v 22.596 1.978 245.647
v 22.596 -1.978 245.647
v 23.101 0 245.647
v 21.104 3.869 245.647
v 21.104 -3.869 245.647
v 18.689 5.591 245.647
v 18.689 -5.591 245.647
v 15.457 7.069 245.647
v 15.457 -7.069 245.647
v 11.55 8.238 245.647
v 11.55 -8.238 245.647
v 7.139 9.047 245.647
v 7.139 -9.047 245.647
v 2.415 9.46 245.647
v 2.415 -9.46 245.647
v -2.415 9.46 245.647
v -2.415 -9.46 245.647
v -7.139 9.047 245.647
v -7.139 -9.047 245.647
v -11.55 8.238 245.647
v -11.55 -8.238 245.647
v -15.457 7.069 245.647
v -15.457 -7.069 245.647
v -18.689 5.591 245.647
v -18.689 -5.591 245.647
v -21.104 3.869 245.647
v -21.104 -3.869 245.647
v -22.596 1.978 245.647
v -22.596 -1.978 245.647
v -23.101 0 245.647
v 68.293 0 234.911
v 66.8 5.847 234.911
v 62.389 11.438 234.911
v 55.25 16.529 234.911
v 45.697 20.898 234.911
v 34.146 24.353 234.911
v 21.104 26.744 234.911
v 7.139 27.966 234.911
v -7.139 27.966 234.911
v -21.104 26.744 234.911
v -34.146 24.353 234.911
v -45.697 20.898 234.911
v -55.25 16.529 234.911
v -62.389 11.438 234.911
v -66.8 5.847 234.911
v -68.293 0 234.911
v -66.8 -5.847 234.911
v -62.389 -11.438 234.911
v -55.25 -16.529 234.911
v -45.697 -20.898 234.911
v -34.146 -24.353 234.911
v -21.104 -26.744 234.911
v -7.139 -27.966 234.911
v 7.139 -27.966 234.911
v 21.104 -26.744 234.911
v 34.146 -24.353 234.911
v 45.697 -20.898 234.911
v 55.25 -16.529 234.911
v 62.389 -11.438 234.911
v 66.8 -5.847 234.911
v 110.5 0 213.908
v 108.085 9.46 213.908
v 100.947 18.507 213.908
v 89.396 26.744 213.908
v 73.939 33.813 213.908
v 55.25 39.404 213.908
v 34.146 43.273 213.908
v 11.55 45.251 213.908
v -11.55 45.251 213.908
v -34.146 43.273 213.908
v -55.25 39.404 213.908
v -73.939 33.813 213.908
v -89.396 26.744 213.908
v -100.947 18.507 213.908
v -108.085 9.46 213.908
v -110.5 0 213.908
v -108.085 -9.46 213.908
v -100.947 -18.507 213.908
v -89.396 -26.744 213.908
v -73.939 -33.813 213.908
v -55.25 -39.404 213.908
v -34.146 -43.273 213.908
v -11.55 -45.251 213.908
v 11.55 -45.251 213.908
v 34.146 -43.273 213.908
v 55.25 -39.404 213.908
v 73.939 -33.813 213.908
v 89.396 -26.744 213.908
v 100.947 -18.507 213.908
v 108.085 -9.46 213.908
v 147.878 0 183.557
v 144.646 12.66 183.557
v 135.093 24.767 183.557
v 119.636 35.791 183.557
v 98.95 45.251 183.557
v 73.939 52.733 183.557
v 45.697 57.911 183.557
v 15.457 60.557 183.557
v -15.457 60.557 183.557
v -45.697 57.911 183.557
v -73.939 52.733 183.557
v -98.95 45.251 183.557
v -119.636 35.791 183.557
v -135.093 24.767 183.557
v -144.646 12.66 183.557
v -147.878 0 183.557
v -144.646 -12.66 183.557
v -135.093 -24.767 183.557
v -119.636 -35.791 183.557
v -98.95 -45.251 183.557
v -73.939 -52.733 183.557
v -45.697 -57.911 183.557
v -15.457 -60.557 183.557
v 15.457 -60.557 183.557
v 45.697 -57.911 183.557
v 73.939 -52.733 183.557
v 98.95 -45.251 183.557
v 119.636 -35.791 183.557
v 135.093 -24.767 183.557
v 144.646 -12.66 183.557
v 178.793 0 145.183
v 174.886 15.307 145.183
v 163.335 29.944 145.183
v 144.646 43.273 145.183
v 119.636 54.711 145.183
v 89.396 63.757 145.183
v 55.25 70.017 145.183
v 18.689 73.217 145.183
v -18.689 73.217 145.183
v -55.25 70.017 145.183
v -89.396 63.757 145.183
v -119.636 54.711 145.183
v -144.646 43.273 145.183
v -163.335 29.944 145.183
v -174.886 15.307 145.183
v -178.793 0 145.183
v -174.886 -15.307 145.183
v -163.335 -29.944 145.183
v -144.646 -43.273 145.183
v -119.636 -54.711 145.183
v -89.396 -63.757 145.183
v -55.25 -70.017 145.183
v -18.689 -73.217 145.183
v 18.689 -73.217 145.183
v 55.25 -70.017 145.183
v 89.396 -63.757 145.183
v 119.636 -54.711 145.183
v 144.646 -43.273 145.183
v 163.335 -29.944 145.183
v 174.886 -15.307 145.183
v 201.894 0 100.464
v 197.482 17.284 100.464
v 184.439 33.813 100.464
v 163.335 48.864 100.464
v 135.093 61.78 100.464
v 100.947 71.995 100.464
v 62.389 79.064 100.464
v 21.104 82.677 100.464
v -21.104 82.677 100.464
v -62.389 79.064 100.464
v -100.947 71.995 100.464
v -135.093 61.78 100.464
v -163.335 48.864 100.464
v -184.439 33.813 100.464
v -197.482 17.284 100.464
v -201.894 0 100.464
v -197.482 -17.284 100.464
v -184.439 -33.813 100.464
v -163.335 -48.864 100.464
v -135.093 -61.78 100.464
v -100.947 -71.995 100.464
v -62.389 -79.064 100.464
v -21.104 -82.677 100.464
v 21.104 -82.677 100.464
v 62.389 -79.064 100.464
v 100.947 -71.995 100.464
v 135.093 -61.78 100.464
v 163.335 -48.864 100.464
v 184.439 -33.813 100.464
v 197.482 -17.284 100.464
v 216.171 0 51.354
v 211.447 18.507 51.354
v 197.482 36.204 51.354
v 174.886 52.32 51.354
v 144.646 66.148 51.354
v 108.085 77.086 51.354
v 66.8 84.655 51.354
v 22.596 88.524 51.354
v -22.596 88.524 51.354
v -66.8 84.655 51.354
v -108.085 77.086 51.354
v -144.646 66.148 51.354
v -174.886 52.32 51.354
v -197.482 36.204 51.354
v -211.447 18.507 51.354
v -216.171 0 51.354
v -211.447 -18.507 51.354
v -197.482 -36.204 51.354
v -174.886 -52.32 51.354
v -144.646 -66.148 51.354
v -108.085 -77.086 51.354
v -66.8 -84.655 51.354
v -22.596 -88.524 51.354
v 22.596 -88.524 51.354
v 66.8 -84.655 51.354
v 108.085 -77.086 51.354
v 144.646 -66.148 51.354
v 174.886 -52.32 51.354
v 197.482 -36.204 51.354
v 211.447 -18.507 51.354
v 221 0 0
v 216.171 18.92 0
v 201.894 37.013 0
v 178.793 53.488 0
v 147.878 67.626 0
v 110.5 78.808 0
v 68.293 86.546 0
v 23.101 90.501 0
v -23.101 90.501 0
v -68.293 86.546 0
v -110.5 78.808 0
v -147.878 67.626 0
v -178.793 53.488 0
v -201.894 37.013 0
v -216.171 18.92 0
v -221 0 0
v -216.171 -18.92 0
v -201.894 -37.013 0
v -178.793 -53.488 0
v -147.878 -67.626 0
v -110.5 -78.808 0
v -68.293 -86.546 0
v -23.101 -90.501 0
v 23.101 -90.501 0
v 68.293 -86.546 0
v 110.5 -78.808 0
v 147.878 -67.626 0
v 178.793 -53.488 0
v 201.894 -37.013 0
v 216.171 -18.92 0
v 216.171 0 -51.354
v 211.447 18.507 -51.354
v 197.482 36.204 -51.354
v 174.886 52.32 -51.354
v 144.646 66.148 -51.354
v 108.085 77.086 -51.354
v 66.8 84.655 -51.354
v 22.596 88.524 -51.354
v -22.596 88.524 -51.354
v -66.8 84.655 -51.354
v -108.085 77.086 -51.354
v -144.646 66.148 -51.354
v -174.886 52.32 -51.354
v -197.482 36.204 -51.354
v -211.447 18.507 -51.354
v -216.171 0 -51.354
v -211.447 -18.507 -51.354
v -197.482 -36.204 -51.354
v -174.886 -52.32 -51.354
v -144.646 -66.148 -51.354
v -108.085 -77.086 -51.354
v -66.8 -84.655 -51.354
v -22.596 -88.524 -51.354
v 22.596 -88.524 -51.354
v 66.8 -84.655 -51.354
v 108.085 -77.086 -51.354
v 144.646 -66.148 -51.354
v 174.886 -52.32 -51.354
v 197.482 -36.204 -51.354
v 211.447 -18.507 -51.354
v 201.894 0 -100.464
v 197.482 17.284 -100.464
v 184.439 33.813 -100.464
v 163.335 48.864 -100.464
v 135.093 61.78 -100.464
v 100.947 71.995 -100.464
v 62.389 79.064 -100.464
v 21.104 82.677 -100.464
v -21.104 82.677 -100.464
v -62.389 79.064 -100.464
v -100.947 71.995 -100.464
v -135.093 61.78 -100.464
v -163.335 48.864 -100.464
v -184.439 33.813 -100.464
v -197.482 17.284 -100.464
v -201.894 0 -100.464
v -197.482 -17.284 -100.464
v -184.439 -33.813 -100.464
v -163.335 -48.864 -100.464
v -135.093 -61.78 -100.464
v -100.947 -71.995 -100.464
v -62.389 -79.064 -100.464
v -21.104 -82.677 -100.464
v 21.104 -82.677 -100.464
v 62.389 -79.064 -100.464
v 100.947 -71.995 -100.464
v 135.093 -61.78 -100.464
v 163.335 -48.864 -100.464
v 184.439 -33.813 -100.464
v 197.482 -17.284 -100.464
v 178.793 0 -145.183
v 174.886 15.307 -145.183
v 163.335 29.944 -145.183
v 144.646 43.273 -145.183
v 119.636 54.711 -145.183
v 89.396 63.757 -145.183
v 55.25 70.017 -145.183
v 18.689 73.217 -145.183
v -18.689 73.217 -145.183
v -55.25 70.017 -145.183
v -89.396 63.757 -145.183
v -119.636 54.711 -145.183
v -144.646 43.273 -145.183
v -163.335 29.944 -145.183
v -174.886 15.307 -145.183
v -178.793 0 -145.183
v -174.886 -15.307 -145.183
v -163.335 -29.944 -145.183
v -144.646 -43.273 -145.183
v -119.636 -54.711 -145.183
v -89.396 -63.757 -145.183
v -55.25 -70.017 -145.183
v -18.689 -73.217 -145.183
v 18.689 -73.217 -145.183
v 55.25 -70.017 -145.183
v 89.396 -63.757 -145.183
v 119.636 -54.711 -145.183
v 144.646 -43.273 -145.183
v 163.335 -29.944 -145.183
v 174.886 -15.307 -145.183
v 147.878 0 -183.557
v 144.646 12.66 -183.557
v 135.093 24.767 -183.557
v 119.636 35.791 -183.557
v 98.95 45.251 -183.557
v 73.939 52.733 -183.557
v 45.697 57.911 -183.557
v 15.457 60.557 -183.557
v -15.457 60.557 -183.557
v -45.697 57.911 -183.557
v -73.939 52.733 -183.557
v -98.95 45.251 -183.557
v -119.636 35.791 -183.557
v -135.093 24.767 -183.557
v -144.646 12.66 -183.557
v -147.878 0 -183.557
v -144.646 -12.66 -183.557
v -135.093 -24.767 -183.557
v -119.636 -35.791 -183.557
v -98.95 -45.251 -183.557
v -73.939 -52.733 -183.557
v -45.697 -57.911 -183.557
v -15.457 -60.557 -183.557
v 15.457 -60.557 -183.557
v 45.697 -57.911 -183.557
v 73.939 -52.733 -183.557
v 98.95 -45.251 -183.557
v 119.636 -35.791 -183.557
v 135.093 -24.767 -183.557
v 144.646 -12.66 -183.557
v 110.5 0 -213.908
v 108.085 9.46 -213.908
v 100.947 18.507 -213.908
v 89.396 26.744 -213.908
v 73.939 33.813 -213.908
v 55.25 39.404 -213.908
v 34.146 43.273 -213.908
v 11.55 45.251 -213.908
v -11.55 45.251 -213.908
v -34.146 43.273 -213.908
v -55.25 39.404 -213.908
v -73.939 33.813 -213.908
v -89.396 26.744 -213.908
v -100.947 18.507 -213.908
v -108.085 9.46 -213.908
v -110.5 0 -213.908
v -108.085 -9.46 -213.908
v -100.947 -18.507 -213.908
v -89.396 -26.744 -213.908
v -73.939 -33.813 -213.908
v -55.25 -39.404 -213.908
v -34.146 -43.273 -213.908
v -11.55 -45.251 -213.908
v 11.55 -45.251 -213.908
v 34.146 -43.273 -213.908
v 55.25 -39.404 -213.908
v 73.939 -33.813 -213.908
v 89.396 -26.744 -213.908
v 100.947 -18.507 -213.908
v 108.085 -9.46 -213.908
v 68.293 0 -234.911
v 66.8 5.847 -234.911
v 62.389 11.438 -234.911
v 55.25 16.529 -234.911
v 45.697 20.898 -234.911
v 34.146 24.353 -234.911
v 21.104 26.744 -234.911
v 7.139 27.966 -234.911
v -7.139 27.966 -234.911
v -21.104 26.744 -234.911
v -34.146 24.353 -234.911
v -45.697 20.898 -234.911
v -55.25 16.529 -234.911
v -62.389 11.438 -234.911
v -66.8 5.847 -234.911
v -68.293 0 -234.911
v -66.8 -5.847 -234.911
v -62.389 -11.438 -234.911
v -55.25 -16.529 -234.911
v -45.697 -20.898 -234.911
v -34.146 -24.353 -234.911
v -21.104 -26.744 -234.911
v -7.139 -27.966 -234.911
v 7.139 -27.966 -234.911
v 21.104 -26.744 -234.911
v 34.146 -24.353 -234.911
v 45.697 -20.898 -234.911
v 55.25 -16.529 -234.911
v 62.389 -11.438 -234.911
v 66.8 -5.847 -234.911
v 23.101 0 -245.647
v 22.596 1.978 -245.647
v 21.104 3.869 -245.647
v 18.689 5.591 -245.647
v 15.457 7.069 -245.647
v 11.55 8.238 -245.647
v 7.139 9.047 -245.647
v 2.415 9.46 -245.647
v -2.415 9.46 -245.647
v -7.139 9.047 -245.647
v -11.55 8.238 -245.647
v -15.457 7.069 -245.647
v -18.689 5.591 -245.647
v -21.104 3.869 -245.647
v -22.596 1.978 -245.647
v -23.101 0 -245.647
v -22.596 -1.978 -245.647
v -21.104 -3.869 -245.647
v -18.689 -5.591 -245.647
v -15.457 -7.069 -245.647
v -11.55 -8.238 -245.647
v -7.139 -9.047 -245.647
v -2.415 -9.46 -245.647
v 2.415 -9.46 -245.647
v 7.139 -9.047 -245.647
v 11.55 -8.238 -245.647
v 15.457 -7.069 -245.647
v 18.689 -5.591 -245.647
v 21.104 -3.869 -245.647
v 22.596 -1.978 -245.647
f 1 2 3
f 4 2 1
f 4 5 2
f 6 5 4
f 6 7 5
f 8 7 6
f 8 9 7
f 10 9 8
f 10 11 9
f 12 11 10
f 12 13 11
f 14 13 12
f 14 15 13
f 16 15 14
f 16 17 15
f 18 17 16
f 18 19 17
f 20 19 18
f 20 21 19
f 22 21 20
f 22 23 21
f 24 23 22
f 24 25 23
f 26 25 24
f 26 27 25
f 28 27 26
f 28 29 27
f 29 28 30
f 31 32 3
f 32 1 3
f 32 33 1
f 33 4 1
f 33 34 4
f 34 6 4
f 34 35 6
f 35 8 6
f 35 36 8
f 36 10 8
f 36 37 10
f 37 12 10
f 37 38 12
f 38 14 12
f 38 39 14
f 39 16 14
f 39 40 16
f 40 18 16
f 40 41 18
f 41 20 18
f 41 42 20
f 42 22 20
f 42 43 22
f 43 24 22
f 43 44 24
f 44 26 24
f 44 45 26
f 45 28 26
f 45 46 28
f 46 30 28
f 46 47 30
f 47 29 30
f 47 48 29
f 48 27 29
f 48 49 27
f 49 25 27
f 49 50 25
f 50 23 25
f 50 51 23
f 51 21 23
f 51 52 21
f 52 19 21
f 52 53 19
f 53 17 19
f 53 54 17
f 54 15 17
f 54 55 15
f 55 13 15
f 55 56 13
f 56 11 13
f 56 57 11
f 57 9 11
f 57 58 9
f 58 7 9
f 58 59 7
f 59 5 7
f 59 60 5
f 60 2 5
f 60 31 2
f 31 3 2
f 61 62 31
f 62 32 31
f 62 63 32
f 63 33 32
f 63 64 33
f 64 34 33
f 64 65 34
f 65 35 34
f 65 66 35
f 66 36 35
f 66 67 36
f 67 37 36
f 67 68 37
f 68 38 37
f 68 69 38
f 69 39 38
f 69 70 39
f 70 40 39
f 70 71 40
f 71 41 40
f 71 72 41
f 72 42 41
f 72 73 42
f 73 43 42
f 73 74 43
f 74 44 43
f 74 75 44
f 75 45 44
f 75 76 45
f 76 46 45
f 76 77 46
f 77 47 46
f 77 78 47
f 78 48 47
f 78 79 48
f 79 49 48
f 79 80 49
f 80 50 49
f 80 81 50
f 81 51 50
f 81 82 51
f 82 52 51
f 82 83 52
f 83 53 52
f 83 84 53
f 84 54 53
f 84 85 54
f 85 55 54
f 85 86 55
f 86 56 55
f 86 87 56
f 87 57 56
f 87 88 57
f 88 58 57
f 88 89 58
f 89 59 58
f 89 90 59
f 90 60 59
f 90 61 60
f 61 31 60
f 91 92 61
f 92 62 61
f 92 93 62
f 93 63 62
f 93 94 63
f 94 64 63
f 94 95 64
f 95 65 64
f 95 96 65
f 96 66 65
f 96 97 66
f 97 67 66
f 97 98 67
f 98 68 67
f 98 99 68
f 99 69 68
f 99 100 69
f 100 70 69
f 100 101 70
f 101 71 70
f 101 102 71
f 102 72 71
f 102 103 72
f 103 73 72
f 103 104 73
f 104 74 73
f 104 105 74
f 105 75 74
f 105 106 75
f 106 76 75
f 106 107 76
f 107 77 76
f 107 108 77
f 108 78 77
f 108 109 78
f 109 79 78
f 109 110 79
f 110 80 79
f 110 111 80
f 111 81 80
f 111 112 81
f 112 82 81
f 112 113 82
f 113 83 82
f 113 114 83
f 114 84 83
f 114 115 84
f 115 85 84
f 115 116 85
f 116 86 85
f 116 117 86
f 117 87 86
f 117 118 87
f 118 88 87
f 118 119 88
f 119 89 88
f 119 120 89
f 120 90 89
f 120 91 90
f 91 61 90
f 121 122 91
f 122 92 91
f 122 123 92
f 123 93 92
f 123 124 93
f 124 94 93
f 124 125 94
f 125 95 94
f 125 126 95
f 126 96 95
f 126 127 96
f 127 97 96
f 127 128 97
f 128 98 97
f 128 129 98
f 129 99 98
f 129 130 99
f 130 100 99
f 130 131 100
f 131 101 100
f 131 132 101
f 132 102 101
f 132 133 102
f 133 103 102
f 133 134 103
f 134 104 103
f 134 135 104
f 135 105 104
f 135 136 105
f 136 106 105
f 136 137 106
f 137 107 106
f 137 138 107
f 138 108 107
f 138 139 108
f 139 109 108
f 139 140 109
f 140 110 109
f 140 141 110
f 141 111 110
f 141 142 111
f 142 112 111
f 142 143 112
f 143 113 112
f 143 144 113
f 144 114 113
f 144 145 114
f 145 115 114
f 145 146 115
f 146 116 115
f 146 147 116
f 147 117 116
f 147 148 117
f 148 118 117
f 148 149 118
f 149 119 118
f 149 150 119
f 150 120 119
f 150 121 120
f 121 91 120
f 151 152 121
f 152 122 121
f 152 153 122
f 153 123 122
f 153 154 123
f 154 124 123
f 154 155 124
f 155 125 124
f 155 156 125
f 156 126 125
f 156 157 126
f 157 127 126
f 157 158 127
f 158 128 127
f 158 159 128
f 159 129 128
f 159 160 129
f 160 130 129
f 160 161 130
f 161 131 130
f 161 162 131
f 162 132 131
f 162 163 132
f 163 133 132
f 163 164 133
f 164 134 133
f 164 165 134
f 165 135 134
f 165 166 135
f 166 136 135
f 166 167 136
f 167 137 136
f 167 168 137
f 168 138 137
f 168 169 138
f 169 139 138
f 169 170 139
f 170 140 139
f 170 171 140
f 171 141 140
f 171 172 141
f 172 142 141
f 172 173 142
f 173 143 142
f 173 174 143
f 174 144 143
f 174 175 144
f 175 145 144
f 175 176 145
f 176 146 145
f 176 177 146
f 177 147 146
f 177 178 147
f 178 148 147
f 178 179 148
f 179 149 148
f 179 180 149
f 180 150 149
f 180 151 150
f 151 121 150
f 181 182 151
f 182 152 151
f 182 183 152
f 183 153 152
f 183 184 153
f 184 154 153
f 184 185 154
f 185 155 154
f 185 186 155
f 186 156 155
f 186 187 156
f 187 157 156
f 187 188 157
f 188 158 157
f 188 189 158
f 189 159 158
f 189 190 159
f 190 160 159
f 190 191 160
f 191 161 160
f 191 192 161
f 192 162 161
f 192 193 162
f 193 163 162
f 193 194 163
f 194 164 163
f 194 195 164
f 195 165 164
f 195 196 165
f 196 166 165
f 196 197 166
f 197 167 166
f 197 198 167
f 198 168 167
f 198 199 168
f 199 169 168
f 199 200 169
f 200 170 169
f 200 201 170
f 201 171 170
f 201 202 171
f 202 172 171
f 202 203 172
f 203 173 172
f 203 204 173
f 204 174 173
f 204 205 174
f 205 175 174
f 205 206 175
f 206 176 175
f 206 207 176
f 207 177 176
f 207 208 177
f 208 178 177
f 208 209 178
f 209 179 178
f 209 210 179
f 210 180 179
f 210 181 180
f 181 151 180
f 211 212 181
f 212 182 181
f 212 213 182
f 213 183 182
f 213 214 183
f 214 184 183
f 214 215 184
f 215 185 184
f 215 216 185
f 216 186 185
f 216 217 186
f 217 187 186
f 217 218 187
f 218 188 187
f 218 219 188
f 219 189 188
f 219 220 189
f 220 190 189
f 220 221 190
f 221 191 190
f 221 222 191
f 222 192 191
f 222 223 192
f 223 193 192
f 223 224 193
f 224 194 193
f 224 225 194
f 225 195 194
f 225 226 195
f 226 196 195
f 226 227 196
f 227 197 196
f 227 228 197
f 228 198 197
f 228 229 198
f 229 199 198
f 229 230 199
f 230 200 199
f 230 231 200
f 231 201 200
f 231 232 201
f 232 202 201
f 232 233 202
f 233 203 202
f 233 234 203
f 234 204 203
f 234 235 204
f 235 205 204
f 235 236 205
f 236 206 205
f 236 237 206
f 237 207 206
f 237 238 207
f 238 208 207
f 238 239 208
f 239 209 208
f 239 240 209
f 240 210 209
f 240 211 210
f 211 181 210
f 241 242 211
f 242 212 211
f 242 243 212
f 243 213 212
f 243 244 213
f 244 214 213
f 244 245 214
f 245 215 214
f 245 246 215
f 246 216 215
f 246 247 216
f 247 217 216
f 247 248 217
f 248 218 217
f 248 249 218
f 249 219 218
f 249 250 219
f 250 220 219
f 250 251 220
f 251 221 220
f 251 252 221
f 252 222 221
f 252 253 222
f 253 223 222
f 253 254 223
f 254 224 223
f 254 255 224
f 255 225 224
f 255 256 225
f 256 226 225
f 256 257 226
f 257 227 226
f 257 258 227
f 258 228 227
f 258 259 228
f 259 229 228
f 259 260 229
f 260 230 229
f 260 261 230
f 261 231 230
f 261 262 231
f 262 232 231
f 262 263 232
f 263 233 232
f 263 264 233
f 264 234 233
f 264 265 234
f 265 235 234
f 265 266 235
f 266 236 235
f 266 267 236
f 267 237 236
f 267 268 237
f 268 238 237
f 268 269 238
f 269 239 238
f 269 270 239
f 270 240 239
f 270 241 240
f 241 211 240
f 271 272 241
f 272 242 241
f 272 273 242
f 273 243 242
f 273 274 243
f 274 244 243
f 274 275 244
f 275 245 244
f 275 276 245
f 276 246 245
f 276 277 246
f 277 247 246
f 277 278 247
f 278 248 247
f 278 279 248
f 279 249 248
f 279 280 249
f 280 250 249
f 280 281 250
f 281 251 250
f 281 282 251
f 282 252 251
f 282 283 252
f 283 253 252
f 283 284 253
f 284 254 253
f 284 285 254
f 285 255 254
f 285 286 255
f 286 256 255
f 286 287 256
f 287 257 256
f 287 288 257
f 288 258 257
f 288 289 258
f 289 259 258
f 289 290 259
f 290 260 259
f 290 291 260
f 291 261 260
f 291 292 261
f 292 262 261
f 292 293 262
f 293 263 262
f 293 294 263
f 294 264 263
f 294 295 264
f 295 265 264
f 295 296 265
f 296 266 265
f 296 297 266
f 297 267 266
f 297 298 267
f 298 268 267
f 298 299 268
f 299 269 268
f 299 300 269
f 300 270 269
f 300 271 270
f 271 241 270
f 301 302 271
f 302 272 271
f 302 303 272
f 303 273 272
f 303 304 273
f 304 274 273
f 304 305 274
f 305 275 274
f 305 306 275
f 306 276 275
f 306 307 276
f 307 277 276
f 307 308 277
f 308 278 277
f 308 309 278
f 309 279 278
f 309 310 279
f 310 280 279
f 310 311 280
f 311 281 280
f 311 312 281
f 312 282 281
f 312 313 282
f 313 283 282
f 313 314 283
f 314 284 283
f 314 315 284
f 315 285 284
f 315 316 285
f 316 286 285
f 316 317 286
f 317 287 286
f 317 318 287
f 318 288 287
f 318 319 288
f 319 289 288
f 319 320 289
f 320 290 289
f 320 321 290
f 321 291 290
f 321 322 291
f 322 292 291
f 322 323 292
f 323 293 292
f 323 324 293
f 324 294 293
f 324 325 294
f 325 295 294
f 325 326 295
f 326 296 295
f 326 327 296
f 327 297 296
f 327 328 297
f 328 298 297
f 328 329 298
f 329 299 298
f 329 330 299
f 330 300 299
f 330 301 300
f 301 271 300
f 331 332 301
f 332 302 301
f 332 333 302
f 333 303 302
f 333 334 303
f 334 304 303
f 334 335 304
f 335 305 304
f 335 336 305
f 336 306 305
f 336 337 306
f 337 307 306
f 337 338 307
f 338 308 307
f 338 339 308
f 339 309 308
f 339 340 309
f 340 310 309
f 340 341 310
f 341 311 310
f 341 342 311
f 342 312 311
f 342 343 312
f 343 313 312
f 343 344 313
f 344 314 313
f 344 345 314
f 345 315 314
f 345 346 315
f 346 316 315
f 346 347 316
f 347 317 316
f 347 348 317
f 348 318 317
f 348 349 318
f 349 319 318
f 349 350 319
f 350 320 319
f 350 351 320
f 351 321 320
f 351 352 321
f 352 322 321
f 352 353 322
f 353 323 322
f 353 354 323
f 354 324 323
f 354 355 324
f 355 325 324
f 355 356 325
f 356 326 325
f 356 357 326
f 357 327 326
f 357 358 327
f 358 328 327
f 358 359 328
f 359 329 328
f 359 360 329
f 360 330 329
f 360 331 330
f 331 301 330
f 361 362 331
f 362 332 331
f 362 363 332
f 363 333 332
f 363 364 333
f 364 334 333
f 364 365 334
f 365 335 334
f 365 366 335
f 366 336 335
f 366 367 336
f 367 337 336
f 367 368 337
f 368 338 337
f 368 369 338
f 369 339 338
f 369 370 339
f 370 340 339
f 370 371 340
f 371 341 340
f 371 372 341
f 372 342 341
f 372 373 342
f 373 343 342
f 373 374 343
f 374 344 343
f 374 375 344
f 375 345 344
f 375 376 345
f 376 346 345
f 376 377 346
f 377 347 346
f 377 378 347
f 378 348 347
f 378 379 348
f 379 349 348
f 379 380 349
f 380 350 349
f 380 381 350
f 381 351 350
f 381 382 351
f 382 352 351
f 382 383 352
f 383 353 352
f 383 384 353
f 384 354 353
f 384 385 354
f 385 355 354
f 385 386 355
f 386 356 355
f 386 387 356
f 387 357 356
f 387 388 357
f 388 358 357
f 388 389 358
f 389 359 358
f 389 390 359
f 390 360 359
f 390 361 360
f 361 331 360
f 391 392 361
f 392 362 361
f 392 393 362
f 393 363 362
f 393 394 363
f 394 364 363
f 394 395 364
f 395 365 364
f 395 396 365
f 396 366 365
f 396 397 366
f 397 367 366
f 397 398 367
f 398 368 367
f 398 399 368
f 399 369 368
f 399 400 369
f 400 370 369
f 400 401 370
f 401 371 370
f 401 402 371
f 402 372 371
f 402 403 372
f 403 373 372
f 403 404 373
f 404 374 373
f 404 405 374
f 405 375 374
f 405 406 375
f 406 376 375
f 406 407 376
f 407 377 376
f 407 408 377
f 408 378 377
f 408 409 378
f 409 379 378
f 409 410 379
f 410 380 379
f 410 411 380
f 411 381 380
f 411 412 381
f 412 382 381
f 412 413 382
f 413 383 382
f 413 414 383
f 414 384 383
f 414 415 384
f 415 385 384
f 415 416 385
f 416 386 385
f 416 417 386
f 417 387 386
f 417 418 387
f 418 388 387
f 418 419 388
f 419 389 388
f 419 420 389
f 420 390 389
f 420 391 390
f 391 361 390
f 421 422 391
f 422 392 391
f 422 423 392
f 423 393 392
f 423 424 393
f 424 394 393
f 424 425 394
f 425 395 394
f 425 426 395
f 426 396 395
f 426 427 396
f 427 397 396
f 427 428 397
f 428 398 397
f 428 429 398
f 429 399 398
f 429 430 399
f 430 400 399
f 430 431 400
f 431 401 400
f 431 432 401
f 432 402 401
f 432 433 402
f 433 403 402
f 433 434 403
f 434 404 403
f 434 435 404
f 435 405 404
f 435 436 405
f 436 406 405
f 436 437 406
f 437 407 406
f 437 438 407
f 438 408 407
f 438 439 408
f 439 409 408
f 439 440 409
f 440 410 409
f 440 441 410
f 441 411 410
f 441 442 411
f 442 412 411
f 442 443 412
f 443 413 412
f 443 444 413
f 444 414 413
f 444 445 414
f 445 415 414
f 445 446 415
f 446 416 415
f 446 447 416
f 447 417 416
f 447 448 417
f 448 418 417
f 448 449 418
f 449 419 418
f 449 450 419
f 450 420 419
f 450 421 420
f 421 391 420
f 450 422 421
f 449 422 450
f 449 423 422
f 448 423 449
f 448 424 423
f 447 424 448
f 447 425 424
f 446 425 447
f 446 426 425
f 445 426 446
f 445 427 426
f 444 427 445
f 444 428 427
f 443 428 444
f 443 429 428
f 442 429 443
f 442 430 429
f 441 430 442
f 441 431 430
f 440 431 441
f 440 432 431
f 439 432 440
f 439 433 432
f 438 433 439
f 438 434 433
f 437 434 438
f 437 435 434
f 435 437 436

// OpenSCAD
// Generated by SolidPython 1.0.1 on 2020-07-29 00:46:52


scale(v = [17, 7, 19]) {
	sphere(r = 13);
}
/***********************************************
*********      SolidPython code:      **********
************************************************
 
# import packages: SolidPython
from solid import *
from solid.utils import *
from itertools import chain, combinations, permutations


class Resize:

    def __init__(self, scad_file):
        self.scad_file = scad_file
        #self.scad_file = import_scad(scad_file)
        # cone/cylinder param:
        self.r1 = 0
        self.r2 = 0
        self.h = 0
        # rectangular prism param:
        self.w = 0
        self.l = 0
        # ellipse param:
        self.r = 0

    # import OpenScad code (file name corresponds to shape)


    # classify shape + parameters
    def assign(self, param1, param2, param3):
        if self.scad_file == 'cone.scad':
            self.r1 = param1
            self.r2 = param2
            self.h = param3
        elif self.scad_file == 'cylinder.scad':
            self.r1 = param1
            self.r2 = param2
            self.h = param3
        elif self.scad_file == 'rectangularPrism.scad':
            self.h = param1
            self.l = param2
            self.w = param3
        else:
            self.r = param1
            self.h = param2

    # resize parameters
    def iterate(self):
        x = range(3, 20, 2)
        i = 1
        if self.scad_file == 'cone.scad':
            tempList = list(permutations(x, 2))
            for temp in tempList:
                param1 = temp[0]
                param2 = temp[1]
                filepath = 'produced_scad_files/' + 'cone' + str(param1) + '_' + str(param2) + '_' + '.scad'
                scad_render_to_file(cylinder(h=param1, r1=param2, r2=0), filepath)

        elif self.scad_file == 'cylinder.scad':
            tempList = list(permutations(x, 3))
            for temp in tempList:
                param1 = temp[0]
                param2 = temp[1]
                filepath = 'produced_scad_files/' + 'cylinder' + str(param1) + '_' + str(param2) + '_' + '.scad'
                scad_render_to_file(cylinder(h=param1, r1=param2, r2=param2), filepath)

        elif self.scad_file == 'rectangularPrism.scad':
            tempList = list(permutations(x, 3))
            for temp in tempList:
                param1 = temp[0]
                param2 = temp[1]
                param3 = temp[2]
                filepath = 'produced_scad_files/' + 'rectangularPrism' + str(param1) + '_' + str(param2) + '_' + str(
                    param3) + '.scad'
                scad_render_to_file(cube(size=(param1, param2, param3)), filepath)

        elif self.scad_file == 'ellipse.scad':
            tempList = list(permutations(x, 4))
            for temp in tempList:
                param1 = temp[0]
                param2 = temp[1]
                param3 = temp[2]
                param4 = temp[3]
                filepath = 'produced_scad_files/' + 'ellipse' + str(param1) + '_' + str(param2) + '_' + str(param3) + '_' + str(param4) + '.scad'
                scad_render_to_file(scale([param1, param2, param3])(sphere(r=param4)), filepath)

    def render_to_scadfile(self):
        scad_render_to_file(scad, 'example.scad') 
 
************************************************/
